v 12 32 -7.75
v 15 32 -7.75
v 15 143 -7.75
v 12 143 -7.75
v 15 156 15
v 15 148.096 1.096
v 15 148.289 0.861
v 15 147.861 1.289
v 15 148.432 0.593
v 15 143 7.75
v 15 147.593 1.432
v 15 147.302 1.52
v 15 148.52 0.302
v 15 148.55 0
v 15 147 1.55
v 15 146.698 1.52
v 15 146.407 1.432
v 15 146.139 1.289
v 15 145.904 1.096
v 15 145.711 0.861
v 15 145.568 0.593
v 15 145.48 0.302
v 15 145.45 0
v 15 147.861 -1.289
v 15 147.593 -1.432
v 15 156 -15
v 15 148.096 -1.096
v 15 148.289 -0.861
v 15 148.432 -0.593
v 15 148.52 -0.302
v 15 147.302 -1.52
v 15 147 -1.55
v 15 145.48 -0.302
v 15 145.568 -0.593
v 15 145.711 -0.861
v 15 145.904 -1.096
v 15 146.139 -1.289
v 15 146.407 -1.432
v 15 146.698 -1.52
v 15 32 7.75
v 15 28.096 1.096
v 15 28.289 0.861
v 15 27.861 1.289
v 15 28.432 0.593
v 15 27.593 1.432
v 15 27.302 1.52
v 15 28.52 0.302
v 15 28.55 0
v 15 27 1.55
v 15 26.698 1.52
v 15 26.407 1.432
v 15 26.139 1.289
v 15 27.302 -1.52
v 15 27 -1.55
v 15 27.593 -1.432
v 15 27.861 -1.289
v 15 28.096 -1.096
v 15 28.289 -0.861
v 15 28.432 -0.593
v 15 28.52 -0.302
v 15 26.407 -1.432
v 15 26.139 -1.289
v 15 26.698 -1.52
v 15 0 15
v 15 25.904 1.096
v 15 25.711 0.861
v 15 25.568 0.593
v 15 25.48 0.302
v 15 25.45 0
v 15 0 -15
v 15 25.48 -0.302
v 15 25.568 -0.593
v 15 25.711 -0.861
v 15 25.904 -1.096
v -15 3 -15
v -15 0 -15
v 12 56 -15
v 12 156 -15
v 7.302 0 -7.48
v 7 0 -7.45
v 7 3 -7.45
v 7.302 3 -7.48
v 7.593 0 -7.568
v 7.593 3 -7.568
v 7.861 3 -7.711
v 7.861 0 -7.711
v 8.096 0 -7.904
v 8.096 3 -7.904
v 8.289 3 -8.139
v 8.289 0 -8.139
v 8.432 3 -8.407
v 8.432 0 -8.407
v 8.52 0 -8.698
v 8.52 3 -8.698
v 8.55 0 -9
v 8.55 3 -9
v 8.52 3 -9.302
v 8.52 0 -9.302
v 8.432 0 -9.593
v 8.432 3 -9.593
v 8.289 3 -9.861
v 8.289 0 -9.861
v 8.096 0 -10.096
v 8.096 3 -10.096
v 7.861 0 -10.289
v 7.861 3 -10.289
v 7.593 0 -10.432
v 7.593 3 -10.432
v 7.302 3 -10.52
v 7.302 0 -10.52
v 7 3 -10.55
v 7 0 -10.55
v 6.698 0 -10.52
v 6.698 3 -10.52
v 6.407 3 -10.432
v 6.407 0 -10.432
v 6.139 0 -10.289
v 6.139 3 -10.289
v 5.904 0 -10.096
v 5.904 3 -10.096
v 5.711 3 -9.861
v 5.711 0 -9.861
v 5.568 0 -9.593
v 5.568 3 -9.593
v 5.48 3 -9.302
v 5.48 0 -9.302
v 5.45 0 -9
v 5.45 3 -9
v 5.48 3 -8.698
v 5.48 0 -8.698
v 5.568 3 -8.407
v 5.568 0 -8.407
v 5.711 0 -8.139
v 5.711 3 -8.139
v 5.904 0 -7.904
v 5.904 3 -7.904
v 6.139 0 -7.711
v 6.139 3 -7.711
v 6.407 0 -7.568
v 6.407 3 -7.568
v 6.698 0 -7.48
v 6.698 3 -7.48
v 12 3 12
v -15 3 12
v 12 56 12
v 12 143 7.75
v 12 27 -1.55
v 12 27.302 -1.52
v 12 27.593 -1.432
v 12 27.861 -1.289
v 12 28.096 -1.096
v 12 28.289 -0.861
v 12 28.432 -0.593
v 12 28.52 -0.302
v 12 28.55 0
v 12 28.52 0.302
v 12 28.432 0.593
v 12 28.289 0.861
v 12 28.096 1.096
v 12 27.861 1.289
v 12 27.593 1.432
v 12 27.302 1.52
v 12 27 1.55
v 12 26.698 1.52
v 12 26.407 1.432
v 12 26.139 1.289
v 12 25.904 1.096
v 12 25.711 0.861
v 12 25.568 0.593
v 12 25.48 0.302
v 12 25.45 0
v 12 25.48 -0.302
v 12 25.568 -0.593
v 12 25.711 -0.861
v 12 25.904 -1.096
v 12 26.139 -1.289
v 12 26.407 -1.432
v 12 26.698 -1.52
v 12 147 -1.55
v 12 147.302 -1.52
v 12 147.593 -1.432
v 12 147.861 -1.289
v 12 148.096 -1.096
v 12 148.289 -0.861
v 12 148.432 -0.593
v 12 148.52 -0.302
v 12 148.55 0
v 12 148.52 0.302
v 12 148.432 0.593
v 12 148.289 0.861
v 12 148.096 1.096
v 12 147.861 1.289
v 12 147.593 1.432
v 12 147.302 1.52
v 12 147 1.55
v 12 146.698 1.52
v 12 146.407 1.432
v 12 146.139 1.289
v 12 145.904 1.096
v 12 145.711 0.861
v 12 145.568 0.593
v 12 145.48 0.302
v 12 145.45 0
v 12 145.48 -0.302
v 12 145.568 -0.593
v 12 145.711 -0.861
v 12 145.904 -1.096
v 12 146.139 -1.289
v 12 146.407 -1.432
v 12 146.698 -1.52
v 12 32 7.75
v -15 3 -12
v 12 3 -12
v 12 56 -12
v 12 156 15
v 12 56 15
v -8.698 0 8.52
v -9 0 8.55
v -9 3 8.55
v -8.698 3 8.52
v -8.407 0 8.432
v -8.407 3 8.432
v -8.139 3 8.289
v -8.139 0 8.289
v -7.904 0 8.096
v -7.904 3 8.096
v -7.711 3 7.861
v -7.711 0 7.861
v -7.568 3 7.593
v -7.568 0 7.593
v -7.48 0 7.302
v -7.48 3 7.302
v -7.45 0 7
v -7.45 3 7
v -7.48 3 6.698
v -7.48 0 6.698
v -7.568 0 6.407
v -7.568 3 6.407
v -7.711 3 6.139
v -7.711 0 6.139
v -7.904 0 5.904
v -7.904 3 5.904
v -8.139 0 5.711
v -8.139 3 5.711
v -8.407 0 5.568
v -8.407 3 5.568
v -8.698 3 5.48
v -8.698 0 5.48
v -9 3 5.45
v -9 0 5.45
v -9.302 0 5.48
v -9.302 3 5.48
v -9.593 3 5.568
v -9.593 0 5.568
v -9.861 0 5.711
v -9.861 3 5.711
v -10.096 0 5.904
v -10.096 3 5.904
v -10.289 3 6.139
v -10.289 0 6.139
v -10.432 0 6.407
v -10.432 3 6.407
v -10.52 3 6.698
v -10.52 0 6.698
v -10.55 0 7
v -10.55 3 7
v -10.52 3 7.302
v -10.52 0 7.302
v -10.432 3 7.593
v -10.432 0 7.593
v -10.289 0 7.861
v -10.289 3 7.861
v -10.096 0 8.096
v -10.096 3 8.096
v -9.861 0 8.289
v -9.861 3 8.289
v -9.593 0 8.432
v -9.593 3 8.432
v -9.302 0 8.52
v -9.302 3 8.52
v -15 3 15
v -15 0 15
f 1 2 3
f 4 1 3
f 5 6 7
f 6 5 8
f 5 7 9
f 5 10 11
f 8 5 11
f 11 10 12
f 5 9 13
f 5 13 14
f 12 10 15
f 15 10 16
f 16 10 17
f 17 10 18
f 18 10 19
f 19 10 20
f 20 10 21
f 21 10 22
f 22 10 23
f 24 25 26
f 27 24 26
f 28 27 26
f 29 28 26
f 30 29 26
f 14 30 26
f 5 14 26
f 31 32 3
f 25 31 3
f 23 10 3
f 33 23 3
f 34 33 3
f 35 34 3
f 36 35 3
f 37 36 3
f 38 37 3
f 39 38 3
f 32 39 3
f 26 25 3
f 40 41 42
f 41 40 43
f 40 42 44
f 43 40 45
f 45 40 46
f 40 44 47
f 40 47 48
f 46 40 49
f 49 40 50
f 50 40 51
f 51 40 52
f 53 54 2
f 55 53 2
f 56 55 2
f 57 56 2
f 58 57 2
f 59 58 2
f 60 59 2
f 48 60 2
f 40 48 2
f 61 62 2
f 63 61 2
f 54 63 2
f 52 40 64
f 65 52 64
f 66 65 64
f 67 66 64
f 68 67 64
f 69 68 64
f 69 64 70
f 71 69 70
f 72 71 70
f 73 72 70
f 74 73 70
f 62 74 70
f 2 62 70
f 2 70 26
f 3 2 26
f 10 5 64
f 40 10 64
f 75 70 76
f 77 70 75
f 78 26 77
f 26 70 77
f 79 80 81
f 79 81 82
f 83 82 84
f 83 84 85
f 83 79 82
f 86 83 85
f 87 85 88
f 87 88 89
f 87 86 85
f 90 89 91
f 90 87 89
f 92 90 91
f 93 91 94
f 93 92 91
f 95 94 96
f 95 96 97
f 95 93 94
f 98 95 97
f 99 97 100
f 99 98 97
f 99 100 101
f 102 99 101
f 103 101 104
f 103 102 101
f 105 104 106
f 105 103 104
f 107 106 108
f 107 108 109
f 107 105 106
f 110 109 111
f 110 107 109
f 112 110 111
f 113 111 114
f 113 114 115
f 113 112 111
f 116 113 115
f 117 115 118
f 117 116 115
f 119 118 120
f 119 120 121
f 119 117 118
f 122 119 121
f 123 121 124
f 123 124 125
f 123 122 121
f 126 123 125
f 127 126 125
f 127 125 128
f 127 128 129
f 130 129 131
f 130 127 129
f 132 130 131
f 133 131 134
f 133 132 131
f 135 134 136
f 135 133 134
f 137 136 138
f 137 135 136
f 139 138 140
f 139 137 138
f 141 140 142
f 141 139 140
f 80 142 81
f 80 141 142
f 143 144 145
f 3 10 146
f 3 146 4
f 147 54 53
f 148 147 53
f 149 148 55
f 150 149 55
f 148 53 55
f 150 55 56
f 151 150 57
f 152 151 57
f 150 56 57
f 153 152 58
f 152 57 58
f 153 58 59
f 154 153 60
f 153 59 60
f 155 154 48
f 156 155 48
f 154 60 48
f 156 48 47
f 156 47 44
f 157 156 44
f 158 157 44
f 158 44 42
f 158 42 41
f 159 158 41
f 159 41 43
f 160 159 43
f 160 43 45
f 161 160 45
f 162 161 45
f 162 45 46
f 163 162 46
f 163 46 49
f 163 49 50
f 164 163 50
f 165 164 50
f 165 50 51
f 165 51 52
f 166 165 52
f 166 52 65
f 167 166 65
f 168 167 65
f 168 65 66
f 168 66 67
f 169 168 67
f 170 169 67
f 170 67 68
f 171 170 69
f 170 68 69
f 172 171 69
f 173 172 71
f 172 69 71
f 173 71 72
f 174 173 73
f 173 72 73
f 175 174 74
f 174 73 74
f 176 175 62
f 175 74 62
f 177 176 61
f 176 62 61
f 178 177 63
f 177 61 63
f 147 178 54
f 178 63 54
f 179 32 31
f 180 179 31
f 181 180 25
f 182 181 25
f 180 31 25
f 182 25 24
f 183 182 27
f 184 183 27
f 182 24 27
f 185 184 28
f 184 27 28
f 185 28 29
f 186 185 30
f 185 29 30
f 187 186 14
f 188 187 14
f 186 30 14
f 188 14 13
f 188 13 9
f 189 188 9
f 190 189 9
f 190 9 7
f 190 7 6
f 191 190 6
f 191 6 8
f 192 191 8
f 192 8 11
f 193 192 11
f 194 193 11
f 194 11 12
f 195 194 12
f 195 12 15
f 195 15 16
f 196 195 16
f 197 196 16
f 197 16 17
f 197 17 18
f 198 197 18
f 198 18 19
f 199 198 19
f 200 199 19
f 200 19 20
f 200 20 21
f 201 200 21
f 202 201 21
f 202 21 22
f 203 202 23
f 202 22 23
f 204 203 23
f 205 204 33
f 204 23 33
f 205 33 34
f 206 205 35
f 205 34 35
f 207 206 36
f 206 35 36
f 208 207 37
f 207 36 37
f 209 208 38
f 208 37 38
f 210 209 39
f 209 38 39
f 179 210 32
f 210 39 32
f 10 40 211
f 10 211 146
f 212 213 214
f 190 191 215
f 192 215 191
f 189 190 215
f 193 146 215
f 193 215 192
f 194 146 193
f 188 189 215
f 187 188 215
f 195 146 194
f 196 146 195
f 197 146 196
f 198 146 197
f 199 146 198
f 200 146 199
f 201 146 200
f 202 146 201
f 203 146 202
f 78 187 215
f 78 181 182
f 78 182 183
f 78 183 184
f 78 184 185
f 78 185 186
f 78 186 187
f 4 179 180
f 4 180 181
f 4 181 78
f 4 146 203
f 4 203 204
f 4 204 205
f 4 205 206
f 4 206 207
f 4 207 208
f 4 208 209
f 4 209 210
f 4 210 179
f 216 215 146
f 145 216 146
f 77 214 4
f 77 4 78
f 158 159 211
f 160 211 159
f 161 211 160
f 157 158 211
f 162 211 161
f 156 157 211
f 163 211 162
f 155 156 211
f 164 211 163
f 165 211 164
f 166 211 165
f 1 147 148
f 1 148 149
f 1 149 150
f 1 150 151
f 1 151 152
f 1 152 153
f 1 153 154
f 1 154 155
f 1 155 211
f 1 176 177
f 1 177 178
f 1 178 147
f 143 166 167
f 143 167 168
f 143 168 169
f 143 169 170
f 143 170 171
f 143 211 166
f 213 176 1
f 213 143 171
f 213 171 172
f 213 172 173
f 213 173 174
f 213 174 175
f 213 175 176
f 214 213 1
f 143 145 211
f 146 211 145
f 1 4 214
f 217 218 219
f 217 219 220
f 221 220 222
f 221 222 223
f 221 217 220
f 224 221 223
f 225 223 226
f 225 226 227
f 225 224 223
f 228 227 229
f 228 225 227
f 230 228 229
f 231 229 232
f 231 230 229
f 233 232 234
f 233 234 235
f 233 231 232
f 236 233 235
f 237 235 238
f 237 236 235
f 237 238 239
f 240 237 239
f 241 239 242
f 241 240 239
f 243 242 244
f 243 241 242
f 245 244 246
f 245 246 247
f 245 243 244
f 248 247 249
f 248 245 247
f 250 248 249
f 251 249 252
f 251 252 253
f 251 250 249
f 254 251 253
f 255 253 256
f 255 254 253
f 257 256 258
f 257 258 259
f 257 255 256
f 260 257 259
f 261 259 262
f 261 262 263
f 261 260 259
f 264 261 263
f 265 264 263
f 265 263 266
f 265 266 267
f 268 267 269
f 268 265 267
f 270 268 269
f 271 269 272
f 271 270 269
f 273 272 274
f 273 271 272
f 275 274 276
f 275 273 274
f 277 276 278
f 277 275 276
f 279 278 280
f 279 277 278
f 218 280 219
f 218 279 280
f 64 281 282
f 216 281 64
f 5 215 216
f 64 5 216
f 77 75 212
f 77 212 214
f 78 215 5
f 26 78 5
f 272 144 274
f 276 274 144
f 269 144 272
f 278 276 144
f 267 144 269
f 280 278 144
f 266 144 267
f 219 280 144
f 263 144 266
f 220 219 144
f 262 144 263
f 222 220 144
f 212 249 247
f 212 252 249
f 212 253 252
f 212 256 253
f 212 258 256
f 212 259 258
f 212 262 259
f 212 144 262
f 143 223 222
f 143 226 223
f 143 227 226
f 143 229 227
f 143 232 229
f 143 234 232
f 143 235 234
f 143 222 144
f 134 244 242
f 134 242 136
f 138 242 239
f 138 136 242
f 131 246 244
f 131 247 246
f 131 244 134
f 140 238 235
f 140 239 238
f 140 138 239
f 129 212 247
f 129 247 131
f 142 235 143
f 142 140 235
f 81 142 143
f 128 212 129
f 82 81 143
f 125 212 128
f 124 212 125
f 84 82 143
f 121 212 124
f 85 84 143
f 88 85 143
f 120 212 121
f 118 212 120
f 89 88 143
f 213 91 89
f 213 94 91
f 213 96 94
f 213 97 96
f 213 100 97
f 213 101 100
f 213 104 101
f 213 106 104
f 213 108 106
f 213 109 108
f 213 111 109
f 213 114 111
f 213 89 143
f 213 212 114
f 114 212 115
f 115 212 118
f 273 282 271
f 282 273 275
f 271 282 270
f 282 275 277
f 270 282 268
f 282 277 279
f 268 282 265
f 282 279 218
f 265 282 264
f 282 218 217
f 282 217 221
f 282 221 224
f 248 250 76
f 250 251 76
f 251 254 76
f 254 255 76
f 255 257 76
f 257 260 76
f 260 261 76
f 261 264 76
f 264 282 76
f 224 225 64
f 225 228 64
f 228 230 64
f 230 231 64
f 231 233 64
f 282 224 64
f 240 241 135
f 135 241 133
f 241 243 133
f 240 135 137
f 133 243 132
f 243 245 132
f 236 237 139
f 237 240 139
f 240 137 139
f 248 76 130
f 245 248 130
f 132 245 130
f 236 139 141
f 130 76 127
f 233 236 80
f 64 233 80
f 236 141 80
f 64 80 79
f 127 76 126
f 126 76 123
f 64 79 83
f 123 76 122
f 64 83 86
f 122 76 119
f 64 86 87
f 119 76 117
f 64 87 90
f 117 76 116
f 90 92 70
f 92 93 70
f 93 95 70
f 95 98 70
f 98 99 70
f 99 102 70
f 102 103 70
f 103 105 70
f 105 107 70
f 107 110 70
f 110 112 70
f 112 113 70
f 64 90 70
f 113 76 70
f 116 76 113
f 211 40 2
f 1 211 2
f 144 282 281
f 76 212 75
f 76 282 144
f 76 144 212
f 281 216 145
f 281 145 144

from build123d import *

# Parameters (mm, degrees)
ESBO_O1_W                = 30
ESBO_O1_H                = 30
ESBO_O1_R                = 1.55
RESSALTO_EXTRUS_O1_DEPTH = 3
ESBO_O2_W                = 3
ESBO_O2_H                = 30
RESSALTO_EXTRUS_O2_DEPTH = 153
ESBO_O3_R                = 1.55
ESBO_O3_W                = 15.5
ESBO_O3_H                = 111
CORTE_EXTRUS_O1_DEPTH    = 153
RESSALTO_EXTRUS_O3_DEPTH = 3
RESSALTO_EXTRUS_O4_DEPTH = 3


with BuildPart() as part:
    # Esboço1 → Ressalto-extrusão1 (new body)
    with BuildSketch(Plane(origin=(0, 0, 0), x_dir=(1, 0, 0), z_dir=(0, 1, 0))):
        Rectangle(ESBO_O1_W, ESBO_O1_H)
        with Locations(Location((-9, -7, 0), (0, 0, 270))):
            Circle(ESBO_O1_R, mode=Mode.SUBTRACT)
        with Locations(Location((7, 9, 0), (0, 0, 270))):
            Circle(ESBO_O1_R, mode=Mode.SUBTRACT)
    extrude(amount=RESSALTO_EXTRUS_O1_DEPTH)

    # Esboço2 → Ressalto-extrusão2 (add)
    with BuildSketch(Plane(origin=(0, 3, 0), x_dir=(1, 0, 0), z_dir=(0, 1, 0))):
        with Locations((13.5, 0)):
            Rectangle(ESBO_O2_W, ESBO_O2_H)
    extrude(amount=RESSALTO_EXTRUS_O2_DEPTH)

    # Esboço3 → Corte-extrusão1 (cut)
    with BuildSketch(Plane(origin=(15, 0, 0), x_dir=(0, 0, -1), z_dir=(1, 0, 0))):
        with Locations((0, 147)):
            Circle(ESBO_O3_R)
        with Locations((0, 27)):
            Circle(ESBO_O3_R)
        with Locations((0, 87.5)):
            Rectangle(ESBO_O3_W, ESBO_O3_H)
    extrude(amount=-CORTE_EXTRUS_O1_DEPTH, mode=Mode.SUBTRACT)

    # Esboço4 → Ressalto-extrusão3 (add)
    with BuildSketch(Plane.XY.offset(15)):
        Polygon((12, 56), (-15, 3), (12, 3), align=None)
    extrude(amount=-RESSALTO_EXTRUS_O3_DEPTH)

    # Esboço5 → Ressalto-extrusão4 (add)
    with BuildSketch(Plane(origin=(0, 0, -15), x_dir=(-1, 0, 0), z_dir=(0, 0, -1))):
        Polygon((15, 3), (-12, 56), (-12, 3), align=None)
    extrude(amount=-RESSALTO_EXTRUS_O4_DEPTH)


solid = part.part
